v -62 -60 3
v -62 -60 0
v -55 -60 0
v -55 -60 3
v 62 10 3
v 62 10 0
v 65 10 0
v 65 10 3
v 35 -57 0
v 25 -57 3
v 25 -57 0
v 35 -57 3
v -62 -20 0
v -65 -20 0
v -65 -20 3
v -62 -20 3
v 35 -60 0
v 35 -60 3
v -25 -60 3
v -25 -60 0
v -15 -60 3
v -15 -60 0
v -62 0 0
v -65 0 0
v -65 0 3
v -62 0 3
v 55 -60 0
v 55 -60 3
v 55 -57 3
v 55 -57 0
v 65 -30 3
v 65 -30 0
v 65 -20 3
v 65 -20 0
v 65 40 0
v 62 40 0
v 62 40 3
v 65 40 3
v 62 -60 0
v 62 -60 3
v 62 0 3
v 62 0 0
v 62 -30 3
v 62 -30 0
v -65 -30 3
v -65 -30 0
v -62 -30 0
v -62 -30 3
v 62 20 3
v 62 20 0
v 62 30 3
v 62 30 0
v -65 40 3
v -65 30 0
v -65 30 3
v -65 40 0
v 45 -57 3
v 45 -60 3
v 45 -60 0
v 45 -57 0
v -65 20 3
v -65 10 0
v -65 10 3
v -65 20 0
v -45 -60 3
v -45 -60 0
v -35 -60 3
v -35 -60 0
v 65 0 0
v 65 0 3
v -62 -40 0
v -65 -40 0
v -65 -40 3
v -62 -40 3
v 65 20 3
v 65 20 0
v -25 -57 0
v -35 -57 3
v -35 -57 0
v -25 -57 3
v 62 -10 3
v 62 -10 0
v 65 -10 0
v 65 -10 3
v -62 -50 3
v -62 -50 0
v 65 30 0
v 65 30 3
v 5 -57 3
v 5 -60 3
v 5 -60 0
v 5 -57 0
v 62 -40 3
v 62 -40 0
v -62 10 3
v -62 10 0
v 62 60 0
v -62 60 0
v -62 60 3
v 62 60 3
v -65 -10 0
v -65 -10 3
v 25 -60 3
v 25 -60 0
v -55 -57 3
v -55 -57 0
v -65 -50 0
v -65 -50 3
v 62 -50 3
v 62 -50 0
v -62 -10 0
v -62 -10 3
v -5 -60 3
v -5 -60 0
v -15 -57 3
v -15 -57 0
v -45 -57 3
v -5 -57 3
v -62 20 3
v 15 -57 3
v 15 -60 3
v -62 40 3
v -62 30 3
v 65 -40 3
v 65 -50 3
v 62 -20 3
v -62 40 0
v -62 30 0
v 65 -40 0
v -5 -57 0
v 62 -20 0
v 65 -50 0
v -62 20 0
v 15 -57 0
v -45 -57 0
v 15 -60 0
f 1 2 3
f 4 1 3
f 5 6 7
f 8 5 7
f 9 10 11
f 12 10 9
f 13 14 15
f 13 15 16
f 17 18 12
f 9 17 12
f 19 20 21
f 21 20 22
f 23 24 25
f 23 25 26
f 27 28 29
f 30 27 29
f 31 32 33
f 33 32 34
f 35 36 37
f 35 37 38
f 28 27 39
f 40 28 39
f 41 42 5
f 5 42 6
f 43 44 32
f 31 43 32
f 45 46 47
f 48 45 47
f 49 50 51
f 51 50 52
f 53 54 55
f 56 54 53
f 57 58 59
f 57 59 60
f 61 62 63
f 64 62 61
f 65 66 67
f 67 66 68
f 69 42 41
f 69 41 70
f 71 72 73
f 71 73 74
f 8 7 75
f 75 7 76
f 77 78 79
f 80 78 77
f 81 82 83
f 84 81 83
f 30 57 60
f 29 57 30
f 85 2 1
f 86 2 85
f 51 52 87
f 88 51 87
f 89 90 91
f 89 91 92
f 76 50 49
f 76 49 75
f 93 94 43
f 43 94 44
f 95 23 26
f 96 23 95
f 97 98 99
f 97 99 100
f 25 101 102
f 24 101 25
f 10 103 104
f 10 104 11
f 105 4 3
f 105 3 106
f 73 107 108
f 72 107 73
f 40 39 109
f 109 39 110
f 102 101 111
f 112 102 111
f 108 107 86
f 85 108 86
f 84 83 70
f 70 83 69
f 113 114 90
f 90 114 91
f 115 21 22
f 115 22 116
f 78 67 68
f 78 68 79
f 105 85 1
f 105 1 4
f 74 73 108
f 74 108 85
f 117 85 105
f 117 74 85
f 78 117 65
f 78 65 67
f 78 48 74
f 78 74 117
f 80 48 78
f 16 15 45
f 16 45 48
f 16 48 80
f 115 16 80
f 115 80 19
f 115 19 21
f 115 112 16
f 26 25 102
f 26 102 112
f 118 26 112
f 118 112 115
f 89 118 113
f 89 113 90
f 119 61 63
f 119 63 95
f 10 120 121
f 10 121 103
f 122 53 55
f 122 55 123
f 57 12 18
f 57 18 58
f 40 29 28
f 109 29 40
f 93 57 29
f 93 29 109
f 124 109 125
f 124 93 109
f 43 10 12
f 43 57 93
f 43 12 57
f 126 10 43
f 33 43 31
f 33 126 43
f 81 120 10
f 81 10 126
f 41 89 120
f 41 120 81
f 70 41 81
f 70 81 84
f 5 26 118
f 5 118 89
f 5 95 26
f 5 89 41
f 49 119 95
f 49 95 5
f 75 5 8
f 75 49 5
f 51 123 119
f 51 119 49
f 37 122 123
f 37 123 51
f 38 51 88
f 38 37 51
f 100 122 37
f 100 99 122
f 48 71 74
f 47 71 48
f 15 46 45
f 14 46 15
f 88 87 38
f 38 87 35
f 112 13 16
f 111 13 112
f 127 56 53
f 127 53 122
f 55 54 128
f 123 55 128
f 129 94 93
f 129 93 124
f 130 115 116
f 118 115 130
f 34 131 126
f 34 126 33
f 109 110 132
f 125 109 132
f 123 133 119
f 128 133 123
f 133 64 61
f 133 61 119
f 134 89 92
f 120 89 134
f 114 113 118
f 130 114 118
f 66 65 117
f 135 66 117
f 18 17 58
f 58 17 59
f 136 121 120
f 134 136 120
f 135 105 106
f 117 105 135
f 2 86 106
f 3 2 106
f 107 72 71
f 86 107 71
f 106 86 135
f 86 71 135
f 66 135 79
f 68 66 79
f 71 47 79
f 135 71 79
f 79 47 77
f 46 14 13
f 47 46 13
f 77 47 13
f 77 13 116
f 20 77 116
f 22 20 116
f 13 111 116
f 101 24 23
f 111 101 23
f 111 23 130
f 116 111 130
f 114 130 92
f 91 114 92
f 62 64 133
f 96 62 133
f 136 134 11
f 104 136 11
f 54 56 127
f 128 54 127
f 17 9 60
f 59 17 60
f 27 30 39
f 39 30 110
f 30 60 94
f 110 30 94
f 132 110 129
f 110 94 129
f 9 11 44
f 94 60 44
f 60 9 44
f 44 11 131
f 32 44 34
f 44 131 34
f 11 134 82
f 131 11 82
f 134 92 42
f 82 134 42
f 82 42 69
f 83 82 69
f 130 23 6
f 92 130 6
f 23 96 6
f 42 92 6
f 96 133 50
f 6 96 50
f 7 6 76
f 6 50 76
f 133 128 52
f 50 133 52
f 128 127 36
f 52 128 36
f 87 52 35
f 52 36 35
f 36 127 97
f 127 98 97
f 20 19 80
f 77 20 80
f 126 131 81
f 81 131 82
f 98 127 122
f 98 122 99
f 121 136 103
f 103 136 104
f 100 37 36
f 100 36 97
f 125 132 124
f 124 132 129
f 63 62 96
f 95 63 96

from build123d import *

# Parameters (mm, degrees)
F0_W     = 130
F0_H     = 120
F2_DEPTH = 3
F1_W     = 3
F1_H     = 10
F3_DEPTH = 25
F4_W     = 10
F4_H     = 3
F5_DEPTH = 25
F6_W     = 3
F6_H     = 10
F7_DEPTH = 25


with BuildPart() as f2:
    # F0 (on Top) → F2 (new body)
    with BuildSketch(Plane.XY):
        Rectangle(F0_W, F0_H)
    extrude(amount=F2_DEPTH)

    # F1 (on face) → F3 (cut)
    with BuildSketch(Plane.XY):
        with Locations((63.5, -55)):
            Rectangle(F1_W, F1_H)
        with Locations((63.5, -35)):
            Rectangle(F1_W, F1_H)
        with Locations((63.5, -15)):
            Rectangle(F1_W, F1_H)
        with Locations((63.5, 5)):
            Rectangle(F1_W, F1_H)
        with Locations((63.5, 25)):
            Rectangle(F1_W, F1_H)
        with Locations((63.5, 45)):
            Rectangle(F1_W, F1_H)
        with Locations((-63.5, -55)):
            Rectangle(F1_W, F1_H)
        with Locations((-63.5, 25)):
            Rectangle(F1_W, F1_H)
        with Locations((-63.5, 5)):
            Rectangle(F1_W, F1_H)
        with Locations((-63.5, -15)):
            Rectangle(F1_W, F1_H)
        with Locations((-63.5, 45)):
            Rectangle(F1_W, F1_H)
        with Locations((-63.5, -35)):
            Rectangle(F1_W, F1_H)
    extrude(amount=F3_DEPTH, mode=Mode.SUBTRACT)

    # F4 (on face) → F5 (cut)
    with BuildSketch(Plane.XY.offset(3)):
        with Locations((-50, -58.5)):
            Rectangle(F4_W, F4_H)
        with Locations((-30, -58.5)):
            Rectangle(F4_W, F4_H)
        with Locations((-10, -58.5)):
            Rectangle(F4_W, F4_H)
        with Locations((10, -58.5)):
            Rectangle(F4_W, F4_H)
        with Locations((30, -58.5)):
            Rectangle(F4_W, F4_H)
        with Locations((50, -58.5)):
            Rectangle(F4_W, F4_H)
    extrude(amount=-F5_DEPTH, mode=Mode.SUBTRACT)

    # F6 (on face) → F7 (cut)
    with BuildSketch(Plane.XY.offset(3)):
        with Locations((63.5, 55)):
            Rectangle(F6_W, F6_H)
        with Locations((-63.5, 55)):
            Rectangle(F6_W, F6_H)
    extrude(amount=-F7_DEPTH, mode=Mode.SUBTRACT)


solid = f2.part
